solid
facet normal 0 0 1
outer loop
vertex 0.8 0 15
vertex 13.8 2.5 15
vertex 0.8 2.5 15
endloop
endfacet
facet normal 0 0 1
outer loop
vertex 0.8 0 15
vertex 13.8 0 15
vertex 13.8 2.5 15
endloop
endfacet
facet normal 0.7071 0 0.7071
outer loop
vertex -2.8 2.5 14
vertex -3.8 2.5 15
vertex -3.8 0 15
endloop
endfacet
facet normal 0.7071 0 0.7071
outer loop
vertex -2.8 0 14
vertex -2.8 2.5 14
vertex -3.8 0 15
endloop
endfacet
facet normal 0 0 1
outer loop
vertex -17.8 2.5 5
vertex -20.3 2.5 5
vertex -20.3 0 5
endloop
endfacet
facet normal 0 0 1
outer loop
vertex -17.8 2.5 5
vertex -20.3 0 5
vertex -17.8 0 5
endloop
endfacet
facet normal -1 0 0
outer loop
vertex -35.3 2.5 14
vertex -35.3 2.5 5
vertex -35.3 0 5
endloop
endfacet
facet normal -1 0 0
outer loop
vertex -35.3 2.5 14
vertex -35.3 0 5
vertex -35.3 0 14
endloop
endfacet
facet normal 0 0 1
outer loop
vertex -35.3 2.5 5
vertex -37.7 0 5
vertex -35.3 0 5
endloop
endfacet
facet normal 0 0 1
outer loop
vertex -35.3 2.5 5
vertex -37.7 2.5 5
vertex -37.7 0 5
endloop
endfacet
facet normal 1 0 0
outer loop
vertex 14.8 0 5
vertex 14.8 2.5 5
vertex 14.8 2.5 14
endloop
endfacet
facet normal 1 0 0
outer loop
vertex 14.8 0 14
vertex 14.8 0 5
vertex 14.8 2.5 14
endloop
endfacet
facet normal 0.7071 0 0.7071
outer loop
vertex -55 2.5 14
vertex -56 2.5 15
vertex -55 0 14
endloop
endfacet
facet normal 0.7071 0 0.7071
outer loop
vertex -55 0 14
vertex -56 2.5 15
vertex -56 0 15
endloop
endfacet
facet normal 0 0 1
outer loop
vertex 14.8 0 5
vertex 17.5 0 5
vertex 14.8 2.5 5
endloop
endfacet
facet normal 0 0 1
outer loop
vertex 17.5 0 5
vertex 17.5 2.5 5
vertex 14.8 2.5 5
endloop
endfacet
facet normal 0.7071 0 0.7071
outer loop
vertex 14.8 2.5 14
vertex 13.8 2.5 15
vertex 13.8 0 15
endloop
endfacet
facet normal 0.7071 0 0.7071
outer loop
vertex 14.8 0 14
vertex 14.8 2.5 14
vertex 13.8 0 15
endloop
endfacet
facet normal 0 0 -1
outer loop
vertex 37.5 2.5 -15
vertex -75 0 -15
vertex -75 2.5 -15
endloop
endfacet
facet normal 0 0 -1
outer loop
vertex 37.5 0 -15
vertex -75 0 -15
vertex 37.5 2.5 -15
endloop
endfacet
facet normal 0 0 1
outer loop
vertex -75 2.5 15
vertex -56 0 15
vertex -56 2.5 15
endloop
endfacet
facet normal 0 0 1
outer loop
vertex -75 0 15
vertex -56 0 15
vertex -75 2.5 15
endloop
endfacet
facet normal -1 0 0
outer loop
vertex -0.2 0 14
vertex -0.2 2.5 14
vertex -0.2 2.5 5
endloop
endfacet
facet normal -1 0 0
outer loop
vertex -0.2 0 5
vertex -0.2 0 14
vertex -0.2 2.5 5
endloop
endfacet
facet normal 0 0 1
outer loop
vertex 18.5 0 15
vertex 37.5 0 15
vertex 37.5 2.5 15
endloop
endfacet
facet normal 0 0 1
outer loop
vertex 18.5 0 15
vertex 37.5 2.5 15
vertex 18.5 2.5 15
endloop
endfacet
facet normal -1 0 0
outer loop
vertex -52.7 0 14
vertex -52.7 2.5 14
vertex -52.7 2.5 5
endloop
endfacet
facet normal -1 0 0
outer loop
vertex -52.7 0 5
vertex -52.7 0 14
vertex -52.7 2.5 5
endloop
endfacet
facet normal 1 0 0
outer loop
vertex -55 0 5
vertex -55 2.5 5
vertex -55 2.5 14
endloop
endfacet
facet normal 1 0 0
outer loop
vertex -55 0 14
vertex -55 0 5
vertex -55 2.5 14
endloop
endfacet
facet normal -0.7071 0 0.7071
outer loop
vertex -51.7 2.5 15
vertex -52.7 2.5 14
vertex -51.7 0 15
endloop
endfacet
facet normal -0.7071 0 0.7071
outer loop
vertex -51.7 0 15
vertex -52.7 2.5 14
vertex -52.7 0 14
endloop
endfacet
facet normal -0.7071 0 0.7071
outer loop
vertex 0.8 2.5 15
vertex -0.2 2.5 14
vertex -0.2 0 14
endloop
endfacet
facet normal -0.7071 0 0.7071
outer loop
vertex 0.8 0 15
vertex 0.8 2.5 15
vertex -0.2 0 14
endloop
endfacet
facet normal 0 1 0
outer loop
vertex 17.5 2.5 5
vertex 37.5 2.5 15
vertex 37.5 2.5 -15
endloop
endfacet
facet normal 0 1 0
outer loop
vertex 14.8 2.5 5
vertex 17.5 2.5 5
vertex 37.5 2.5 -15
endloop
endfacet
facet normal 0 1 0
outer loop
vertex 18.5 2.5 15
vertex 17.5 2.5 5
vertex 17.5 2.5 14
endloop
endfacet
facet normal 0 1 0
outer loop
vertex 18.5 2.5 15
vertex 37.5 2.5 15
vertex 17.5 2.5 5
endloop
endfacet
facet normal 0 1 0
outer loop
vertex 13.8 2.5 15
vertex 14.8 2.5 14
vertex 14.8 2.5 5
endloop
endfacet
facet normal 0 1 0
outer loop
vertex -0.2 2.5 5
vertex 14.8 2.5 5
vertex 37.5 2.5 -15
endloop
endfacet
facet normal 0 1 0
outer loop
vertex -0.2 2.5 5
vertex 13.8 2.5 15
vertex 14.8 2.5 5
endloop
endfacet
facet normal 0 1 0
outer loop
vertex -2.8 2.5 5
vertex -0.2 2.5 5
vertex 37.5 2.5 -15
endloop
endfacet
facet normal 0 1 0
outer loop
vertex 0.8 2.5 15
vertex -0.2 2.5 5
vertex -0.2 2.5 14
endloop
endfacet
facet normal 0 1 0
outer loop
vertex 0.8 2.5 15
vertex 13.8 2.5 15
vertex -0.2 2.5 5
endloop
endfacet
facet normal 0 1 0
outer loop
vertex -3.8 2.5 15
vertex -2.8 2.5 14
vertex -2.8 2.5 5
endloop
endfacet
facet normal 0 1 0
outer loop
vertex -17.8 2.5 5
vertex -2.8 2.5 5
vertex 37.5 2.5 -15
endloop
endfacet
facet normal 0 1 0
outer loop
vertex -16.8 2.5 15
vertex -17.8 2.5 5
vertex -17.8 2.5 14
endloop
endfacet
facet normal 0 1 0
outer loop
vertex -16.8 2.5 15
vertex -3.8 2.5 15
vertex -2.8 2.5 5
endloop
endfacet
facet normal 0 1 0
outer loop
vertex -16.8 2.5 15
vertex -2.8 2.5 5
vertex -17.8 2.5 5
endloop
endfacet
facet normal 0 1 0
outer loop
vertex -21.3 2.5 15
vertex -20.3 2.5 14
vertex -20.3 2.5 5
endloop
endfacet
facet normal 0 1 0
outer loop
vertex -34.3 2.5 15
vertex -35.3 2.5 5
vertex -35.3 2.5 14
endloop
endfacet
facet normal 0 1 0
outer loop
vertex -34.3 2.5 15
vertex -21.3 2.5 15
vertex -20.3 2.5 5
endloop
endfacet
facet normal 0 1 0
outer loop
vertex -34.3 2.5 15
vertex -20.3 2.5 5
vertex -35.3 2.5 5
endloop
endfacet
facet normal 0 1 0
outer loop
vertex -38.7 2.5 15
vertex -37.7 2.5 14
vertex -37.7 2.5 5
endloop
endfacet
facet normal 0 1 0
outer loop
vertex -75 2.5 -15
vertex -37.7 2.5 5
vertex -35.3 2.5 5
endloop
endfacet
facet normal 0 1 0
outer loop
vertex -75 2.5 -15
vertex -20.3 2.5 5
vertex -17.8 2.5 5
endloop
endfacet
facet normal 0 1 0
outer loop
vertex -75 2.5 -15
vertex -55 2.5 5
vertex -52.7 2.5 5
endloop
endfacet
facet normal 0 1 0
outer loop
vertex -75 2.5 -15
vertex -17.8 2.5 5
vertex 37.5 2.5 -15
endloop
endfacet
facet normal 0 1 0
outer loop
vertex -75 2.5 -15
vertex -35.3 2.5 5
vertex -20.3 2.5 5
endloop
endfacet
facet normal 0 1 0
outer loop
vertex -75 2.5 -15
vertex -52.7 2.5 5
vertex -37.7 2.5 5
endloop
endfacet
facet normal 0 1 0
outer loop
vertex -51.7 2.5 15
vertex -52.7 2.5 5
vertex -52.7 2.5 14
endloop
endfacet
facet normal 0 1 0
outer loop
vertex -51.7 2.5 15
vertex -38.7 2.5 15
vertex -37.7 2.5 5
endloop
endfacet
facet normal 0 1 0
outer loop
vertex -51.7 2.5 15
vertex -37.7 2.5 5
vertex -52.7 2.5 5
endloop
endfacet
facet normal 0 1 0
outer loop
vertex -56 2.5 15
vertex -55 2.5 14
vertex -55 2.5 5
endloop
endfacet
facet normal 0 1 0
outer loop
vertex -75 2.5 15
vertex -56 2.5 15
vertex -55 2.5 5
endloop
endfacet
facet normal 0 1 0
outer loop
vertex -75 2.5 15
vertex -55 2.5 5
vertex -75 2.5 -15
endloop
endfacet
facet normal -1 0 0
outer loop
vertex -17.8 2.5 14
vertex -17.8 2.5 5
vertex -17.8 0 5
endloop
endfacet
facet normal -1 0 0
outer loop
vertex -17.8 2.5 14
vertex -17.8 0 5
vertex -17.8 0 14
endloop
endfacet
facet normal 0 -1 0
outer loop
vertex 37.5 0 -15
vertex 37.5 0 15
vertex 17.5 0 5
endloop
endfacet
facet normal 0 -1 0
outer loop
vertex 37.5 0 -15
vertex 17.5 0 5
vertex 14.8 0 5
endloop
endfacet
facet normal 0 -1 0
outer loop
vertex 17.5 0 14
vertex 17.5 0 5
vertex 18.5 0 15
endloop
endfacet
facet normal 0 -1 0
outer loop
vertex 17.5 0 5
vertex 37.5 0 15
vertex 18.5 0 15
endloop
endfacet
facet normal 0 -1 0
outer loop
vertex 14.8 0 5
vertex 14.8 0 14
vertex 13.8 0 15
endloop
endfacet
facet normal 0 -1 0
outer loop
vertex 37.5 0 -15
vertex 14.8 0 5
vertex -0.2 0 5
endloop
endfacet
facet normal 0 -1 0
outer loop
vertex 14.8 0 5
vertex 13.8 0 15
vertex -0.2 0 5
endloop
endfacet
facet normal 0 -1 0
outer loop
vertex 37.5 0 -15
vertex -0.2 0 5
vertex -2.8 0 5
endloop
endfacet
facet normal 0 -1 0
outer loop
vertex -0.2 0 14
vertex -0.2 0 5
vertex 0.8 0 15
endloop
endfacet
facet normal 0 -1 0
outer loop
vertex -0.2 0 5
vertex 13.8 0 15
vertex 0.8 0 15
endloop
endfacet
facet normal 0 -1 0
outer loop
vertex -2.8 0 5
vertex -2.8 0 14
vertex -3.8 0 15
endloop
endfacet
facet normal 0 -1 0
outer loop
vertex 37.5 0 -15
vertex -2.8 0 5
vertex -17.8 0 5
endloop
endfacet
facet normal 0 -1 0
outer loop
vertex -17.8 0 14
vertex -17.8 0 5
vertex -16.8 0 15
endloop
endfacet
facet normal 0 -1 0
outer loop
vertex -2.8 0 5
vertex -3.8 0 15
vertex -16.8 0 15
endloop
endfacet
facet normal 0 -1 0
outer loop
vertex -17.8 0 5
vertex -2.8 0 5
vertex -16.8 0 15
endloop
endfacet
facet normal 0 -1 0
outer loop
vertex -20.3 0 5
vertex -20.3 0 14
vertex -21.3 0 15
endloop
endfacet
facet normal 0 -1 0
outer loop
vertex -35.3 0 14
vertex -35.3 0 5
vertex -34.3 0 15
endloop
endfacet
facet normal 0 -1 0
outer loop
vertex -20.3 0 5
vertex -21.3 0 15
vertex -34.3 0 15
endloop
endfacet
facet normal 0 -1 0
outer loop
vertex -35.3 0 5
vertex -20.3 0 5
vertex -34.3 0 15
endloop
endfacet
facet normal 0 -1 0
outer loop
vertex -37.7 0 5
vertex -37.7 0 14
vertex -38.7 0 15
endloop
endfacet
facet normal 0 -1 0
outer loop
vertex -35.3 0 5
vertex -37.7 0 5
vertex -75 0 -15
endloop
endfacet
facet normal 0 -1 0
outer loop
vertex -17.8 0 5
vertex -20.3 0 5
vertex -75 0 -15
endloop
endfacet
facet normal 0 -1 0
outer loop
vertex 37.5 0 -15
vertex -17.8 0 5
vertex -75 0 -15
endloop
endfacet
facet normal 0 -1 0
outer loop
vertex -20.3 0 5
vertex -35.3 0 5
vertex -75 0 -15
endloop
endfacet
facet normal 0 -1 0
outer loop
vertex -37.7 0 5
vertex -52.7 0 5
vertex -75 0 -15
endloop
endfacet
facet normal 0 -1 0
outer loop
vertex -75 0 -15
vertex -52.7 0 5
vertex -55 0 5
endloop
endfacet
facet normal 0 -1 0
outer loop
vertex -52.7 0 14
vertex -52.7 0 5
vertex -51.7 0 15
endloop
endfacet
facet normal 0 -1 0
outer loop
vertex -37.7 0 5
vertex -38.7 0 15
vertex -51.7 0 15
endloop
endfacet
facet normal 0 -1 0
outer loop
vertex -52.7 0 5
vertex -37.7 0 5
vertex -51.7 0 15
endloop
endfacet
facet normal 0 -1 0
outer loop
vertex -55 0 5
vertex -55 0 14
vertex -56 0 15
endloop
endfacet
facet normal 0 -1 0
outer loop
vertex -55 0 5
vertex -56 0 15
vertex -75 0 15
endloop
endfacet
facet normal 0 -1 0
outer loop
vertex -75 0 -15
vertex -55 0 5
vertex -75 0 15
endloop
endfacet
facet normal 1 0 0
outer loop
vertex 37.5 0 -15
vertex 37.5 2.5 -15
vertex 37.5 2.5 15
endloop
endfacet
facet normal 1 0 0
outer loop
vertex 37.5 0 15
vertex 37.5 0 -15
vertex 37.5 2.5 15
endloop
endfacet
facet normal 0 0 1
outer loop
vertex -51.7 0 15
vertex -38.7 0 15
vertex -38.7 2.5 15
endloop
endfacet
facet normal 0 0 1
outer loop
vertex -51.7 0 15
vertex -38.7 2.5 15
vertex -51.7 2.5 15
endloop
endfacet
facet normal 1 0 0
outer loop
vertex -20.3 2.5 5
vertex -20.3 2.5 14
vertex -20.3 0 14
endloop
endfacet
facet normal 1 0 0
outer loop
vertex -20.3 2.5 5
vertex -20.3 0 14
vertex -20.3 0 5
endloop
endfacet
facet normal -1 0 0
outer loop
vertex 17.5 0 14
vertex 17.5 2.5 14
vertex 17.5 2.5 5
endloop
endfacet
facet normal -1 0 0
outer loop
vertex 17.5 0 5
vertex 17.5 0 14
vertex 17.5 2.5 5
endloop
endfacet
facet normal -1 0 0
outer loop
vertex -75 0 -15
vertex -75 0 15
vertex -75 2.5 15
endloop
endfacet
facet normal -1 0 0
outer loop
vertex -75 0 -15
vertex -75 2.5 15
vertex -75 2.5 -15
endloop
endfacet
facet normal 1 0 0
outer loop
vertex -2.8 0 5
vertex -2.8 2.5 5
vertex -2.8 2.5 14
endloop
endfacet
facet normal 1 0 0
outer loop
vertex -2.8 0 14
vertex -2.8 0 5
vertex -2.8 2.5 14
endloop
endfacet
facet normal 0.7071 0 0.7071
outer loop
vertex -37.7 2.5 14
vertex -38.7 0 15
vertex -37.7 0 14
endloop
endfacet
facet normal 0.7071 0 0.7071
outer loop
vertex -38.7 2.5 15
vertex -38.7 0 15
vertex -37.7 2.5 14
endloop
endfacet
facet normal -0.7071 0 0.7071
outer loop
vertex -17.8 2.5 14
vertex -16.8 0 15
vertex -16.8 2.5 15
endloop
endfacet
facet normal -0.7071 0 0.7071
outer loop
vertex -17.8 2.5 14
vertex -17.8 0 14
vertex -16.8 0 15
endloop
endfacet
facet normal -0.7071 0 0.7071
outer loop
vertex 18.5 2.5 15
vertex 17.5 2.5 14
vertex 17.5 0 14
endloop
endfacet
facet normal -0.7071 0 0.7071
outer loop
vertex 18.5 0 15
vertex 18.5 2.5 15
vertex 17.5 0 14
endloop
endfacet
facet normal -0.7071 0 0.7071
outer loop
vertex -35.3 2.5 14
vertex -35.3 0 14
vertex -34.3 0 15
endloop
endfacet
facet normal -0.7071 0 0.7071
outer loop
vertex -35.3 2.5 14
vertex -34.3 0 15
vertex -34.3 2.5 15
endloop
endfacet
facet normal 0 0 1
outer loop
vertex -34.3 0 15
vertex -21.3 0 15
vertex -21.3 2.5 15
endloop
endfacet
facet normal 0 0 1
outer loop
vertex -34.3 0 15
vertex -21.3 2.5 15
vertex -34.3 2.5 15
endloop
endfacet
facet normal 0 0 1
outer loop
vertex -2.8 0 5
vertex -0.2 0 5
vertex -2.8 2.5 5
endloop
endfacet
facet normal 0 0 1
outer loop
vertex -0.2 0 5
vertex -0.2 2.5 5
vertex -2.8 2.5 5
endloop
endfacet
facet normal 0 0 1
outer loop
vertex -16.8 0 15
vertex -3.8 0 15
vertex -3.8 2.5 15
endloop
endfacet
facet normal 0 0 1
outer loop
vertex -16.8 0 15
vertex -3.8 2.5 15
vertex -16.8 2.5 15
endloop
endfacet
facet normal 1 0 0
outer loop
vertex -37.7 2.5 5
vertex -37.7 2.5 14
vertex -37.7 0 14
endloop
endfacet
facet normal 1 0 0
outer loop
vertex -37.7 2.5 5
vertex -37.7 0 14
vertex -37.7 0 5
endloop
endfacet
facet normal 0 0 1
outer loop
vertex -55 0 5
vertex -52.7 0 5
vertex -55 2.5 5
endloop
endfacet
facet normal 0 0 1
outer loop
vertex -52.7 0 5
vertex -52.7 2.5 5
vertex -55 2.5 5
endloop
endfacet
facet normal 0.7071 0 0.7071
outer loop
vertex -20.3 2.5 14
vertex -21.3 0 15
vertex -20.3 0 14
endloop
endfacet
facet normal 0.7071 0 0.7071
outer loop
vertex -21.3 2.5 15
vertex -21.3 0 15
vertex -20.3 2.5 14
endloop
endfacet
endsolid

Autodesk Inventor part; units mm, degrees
ref_plane "YZ Plane" through (0, 0, 0) normal (1, 0, 0) x (0, 1, 0)
ref_plane "XZ Plane" through (0, 0, 0) normal (0, 1, 0) x (-1, 0, 0)
ref_plane "XY Plane" through (0, 0, 0) normal (0, 0, 1) x (1, 0, 0)
sketch "Sketch1" plane through (0, 0, 0) normal (0, 1, 0) x (-1, 0, 0)
  line L0 (75, -15) -> (-75, -15)
  line L1 (-75, -15) -> (-75, 15)
  line L2 (-75, 15) -> (75, 15)
  line L3 (75, 15) -> (75, -15)
  point P0 (0, 0)
  point P1 (0, -15)
  point P2 (75, 0)
  point P3 (0, 15)
  dimension "d0" = 150
  dimension "d1" = 30
extrude "Extrusion1" add sketch "Sketch1" along normal blind 2.5
sketch "Sketch3" plane through (0, 2.5, 0) normal (0, 1, 0) x (1, 0, 0)
  line L0 (-75, 15) -> (-75, -15) projected
  line L1 (-75, -15) -> (75, -15) projected
  line L2 (-55, -15) -> (-52.7, -15)
  line L3 (-52.7, -15) -> (-52.7, -5)
  line L4 (-52.7, -5) -> (-55, -5)
  line L5 (-55, -5) -> (-55, -15)
  point P0 (0, 0)
  point P1 (-53.85, -15)
  point P2 (0, -15)
  dimension "d4" = 2.3
  dimension "d5" = 10
  dimension "d6" = 20
extrude "-0.2" cut sketch "Sketch3" along normal through all both and the other way through all
sketch "Sketch4" plane through (0, 2.5, 0) normal (0, 1, 0) x (1, 0, 0)
  line L0 (-75, -15) -> (-55, -15) projected
  line L1 (-37.7, -5) -> (-35.3, -5)
  line L2 (-35.3, -5) -> (-35.3, -15)
  line L3 (-35.3, -15) -> (-37.7, -15)
  line L4 (-37.7, -15) -> (-37.7, -5)
  point P0 (-52.7, -15)
  point P1 (0, 0)
  point P2 (-36.5, -15)
  point P3 (-65, -15)
  dimension "d9" = 10
  dimension "d10" = 2.4
  dimension "d11" = 15
extrude "-0.1" cut sketch "Sketch4" against normal through all
sketch "Sketch5" plane through (0, 2.5, 0) normal (0, 1, 0) x (1, 0, 0)
  line L0 (-75, -15) -> (-55, -15) projected
  line L1 (-20.3, -5) -> (-17.8, -5)
  line L2 (-17.8, -5) -> (-17.8, -15)
  line L3 (-17.8, -15) -> (-20.3, -15)
  line L4 (-20.3, -15) -> (-20.3, -5)
  point P0 (-35.3, -5)
  point P1 (0, 0)
  point P2 (-19.05, -15)
  point P3 (-65, -15)
  dimension "d15" = 10
  dimension "d16" = 2.5
  dimension "d17" = 15
extrude "0.0" cut sketch "Sketch5" against normal through all
sketch "Sketch6" plane through (0, 2.5, 0) normal (0, 1, 0) x (1, 0, 0)
  line L0 (-75, -15) -> (-55, -15) projected
  line L1 (-2.8, -15) -> (-0.2, -15)
  line L2 (-0.2, -15) -> (-0.2, -5)
  line L3 (-0.2, -5) -> (-2.8, -5)
  line L4 (-2.8, -5) -> (-2.8, -15)
  point P0 (-17.8, -5)
  point P1 (0, 0)
  point P2 (-1.5, -15)
  point P3 (-65, -15)
  dimension "d20" = 10
  dimension "d21" = 2.6
  dimension "d22" = 15
extrude "+0.1" cut sketch "Sketch6" against normal through all
sketch "Sketch7" plane through (0, 2.5, 0) normal (0, 1, 0) x (1, 0, 0)
  line L0 (-75, -15) -> (-55, -15) projected
  line L1 (14.8, -15) -> (17.5, -15)
  line L2 (17.5, -15) -> (17.5, -5)
  line L3 (17.5, -5) -> (14.8, -5)
  line L4 (14.8, -5) -> (14.8, -15)
  point P0 (-0.2, -5)
  point P1 (0, 0)
  point P2 (16.15, -15)
  point P3 (-65, -15)
  dimension "d25" = 10
  dimension "d26" = 2.7
  dimension "d27" = 15
extrude "+0.2" cut sketch "Sketch7" against normal through all
sketch "Sketch8" plane through (0, 2.5, 0) normal (0, 1, 0) x (1, 0, 0)
  line L0 (75, 15) -> (-75, 15) projected
  line L1 (-75, 15) -> (-75, -15) projected
  line L2 (-75, -15) -> (-55, -15) projected
  line L3 (-75, 15) -> (37.5, 15)
  line L4 (37.5, 15) -> (37.5, -15)
  line L5 (37.5, -15) -> (-75, -15)
  line L6 (-75, -15) -> (-75, 15)
  point P0 (17.5, -5)
  point P1 (0, 0)
  point P2 (-18.75, -15)
  point P3 (-65, -15)
  point P4 (-18.75, 15)
  point P5 (0, 15)
  point P6 (-75, 0)
  point P7 (-75, 0)
  dimension "d30" = 20
extrude "Extrusion7" cut sketch "Sketch8" against normal through all keep common part
chamfer "Chamfer1" distance 1 angle 45 10 edges at (-55, 1.25, 15) (-52.7, 1.25, 15) (-37.7, 1.25, 15) (-35.3, 1.25, 15) (-20.3, 1.25, 15) (-17.8, 1.25, 15) (-2.8, 1.25, 15) (-0.2, 1.25, 15) (14.8, 1.25, 15) (17.5, 1.25, 15)
equation "\"d2\" = CardThickness"
equation "\"d12\" = CardThickness"
equation "\"d16\" = CardThickness"
equation "\"d18\" = CardThickness"
equation "\"d23\" = CardThickness"
equation "\"d28\" = CardThickness"
equation "\"d31\" = CardThickness"
equation "\"CardThickness\" = 2.5"
properties part number "SlotRuler"
